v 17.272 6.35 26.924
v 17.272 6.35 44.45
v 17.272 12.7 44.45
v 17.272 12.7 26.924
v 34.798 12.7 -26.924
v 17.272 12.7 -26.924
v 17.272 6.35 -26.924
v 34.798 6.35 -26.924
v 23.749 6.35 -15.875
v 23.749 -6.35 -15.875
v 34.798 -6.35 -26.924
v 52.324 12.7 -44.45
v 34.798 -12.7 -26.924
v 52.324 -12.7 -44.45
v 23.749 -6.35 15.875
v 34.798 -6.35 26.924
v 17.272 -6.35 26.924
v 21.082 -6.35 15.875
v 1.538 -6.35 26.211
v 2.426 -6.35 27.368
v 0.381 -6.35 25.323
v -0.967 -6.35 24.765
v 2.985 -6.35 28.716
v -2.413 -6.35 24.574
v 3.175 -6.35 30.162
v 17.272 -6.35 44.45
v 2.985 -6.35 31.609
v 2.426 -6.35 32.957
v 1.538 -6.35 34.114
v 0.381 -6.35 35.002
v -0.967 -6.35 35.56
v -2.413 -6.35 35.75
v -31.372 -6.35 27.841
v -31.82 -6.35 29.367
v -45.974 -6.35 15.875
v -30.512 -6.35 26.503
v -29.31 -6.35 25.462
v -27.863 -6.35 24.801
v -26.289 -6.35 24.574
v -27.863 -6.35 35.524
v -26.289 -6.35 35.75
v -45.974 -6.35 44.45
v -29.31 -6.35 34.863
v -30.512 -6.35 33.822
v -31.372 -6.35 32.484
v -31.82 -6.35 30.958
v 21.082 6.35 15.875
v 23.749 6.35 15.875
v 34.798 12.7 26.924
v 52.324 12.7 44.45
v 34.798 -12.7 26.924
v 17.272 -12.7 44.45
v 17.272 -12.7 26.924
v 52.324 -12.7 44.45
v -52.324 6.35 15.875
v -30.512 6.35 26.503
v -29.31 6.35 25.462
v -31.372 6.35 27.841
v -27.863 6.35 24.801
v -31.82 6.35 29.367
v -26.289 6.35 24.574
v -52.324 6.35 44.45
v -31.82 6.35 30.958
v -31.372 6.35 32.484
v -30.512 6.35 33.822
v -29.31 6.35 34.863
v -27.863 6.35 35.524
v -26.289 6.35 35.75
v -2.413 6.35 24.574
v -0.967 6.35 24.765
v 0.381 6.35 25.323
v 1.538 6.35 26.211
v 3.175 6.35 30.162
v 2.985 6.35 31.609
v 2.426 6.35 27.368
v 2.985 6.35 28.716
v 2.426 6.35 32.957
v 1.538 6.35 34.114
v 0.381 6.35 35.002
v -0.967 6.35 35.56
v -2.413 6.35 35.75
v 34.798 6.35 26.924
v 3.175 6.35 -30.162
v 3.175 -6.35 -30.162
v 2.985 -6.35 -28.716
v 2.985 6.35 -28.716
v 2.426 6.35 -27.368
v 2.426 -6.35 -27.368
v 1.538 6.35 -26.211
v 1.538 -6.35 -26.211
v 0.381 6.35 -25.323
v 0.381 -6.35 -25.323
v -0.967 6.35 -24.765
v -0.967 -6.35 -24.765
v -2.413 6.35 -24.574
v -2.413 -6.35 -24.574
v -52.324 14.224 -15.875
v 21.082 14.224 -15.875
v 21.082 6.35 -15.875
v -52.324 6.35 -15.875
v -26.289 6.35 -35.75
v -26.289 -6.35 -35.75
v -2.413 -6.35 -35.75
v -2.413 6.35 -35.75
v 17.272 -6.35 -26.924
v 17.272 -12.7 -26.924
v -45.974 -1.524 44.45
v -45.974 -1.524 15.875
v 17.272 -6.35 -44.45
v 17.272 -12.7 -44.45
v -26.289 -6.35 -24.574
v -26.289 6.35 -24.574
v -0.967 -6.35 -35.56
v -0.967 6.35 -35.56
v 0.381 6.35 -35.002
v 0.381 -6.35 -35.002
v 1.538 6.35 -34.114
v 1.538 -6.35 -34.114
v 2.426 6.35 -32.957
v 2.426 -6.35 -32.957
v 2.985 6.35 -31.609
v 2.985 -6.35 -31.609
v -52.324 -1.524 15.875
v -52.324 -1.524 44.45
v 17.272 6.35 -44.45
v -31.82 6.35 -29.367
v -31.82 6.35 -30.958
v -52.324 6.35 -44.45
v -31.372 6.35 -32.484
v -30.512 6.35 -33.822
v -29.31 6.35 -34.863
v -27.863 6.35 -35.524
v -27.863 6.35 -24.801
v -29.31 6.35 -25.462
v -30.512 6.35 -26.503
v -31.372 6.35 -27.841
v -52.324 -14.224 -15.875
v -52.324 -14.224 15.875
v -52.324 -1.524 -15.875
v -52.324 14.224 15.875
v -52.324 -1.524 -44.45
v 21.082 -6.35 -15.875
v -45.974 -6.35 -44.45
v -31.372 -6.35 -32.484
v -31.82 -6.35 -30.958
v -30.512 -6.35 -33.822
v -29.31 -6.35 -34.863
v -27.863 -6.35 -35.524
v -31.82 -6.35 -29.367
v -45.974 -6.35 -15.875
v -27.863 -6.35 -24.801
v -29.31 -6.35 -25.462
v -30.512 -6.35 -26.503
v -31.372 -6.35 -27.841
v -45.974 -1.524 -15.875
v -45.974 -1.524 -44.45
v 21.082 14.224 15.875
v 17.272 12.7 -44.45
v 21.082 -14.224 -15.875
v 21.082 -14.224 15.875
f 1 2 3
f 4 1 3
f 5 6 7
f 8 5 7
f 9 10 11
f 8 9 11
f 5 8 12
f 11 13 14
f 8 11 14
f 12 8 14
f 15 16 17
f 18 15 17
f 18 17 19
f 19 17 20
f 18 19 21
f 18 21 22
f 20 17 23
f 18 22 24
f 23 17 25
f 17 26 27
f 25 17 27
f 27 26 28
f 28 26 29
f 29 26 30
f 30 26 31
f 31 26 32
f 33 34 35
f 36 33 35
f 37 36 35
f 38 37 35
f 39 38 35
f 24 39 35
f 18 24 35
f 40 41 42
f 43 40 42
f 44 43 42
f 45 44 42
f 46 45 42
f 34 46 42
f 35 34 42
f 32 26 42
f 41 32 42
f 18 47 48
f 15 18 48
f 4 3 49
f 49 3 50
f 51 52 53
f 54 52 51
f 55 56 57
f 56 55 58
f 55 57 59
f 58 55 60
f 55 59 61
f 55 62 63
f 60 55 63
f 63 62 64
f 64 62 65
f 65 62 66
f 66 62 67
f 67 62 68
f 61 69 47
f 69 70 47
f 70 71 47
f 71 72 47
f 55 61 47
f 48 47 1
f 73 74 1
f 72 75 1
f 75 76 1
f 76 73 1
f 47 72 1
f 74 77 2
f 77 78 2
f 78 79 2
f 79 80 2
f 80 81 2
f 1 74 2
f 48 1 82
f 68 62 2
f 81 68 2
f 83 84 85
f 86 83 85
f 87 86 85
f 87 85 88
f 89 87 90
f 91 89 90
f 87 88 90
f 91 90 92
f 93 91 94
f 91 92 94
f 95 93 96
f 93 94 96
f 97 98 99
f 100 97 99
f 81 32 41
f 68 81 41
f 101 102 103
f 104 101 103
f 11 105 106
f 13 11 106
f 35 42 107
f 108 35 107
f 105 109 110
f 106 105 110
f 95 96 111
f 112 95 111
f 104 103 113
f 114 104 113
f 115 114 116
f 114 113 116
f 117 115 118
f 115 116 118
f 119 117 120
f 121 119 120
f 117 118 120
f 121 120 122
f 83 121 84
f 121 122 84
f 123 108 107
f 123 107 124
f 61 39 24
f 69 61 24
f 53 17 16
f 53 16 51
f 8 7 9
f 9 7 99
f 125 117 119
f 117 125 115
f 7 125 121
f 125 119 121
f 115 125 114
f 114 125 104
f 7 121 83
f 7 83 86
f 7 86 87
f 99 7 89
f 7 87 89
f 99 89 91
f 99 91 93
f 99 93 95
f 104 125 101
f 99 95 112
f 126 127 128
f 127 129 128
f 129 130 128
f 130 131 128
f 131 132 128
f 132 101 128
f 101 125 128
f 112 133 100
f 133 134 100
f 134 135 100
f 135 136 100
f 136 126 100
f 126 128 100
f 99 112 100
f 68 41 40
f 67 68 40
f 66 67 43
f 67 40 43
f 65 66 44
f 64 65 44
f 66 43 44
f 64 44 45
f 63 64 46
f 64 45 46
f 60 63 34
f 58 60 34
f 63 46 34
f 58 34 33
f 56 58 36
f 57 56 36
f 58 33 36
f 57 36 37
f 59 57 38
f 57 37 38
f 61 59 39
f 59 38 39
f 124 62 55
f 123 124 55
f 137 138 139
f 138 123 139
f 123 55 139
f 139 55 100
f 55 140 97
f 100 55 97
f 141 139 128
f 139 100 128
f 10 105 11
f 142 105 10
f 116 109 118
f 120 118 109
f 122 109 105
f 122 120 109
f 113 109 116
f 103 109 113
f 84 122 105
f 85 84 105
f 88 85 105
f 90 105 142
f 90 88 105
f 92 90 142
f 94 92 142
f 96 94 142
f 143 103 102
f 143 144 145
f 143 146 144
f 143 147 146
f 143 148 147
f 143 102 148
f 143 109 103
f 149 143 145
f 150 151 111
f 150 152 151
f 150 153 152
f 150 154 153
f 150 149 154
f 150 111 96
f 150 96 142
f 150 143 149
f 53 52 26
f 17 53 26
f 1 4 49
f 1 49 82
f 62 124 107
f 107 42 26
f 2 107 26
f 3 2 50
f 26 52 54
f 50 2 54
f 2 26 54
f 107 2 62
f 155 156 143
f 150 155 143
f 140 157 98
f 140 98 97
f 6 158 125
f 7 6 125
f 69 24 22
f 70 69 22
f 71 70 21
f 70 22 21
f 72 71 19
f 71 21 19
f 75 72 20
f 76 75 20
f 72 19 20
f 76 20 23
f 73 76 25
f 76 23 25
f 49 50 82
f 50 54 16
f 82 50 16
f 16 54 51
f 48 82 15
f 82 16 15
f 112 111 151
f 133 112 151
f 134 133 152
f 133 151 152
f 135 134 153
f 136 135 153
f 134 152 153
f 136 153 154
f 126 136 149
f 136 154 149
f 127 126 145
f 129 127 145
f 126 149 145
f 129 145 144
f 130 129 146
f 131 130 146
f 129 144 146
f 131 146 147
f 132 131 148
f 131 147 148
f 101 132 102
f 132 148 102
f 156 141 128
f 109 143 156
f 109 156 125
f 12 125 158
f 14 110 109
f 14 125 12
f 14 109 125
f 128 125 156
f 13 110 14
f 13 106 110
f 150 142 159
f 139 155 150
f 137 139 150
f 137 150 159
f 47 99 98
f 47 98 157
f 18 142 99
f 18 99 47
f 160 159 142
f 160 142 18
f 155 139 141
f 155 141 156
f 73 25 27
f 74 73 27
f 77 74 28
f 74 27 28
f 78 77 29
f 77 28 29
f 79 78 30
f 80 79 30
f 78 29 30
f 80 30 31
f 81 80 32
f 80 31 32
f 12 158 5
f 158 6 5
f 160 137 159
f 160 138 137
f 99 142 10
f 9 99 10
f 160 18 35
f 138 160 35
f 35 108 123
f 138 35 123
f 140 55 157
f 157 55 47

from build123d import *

# Parameters (mm, degrees)
F0_W      = 104.648
F0_H      = 88.9
F1_DEPTH  = 12.7
F2_W      = 69.596
F2_H      = 6.35
F3_DEPTH  = 28.575
F4_W      = 69.596
F4_H      = 6.35
F5_DEPTH  = 28.575
F10_DEPTH = 1.524
F11_W     = 31.242
F11_H     = 31.75
F12_DEPTH = 28.449
F14_W     = 6.35
F14_H     = 11.049
F15_DEPTH = 35.053
F17_W     = 6.35
F17_H     = 11.049
F20_DEPTH = 35.053
F19_W     = 6.35
F19_H     = 11.049
F21_DEPTH = 35.053
F22_W     = 6.35
F22_H     = 11.049
F23_DEPTH = 35.053
F25_DEPTH = 26.925
F27_DEPTH = 20.575
F29_DEPTH = 20.575


with BuildPart() as f1:
    # F0 (on Front) → F1 (new body, symmetric)
    with BuildSketch(Plane.XZ):
        Rectangle(F0_W, F0_H)
    extrude(amount=F1_DEPTH, both=True)

    # F2 (on face) → F3 (cut)
    with BuildSketch(Plane.XY.offset(44.45)):
        with Locations((-17.526, 9.525)):
            Rectangle(F2_W, F2_H)
        Polygon((-45.974, -1.524), (-52.324, -1.524), (-52.324, -12.7), (17.272, -12.7), (17.272, -6.35), (-45.974, -6.35), align=None)
    extrude(amount=-F3_DEPTH, mode=Mode.SUBTRACT)

    # F4 (on face) → F5 (cut)
    with BuildSketch(Plane(origin=(0, 0, -44.45), x_dir=(1, 0, 0), z_dir=(0, 0, -1))):
        Polygon((-45.974, 6.35), (17.272, 6.35), (17.272, 12.7), (-52.324, 12.7), (-52.324, 1.524), (-45.974, 1.524), align=None)
        with Locations((-17.526, -9.525)):
            Rectangle(F4_W, F4_H)
    extrude(amount=-F5_DEPTH, mode=Mode.SUBTRACT)

    # F9 (on face) + F7 (on face) → F10 (join, symmetric)
    with BuildSketch(Plane(origin=(0, 12.7, 0), x_dir=(-1, 0, 0), z_dir=(0, 1, 0))):
        Polygon((52.324, 15.875), (-17.272, 15.875), (-52.324, 15.875), (-52.324, -15.875), (-17.272, -15.875), (52.324, -15.875), align=None)
    with BuildSketch(Plane.XZ.offset(12.7)):
        Polygon((52.324, -15.875), (52.324, 15.875), (17.272, 15.875), (-52.324, 15.875), (-52.324, -15.875), (17.272, -15.875), align=None)
    extrude(amount=F10_DEPTH, both=True, dir=(0, 1, 0))

    # F11 (on face) → F12 (cut, through all)
    with BuildSketch(Plane.XZ.offset(14.224)):
        with Locations((36.703, 0)):
            Rectangle(F11_W, F11_H)
    extrude(amount=-F12_DEPTH, mode=Mode.SUBTRACT)

    # F14 (on face) → F15 (cut, through all)
    with BuildSketch(Plane(origin=(17.272, 0, 0), x_dir=(0, -1, 0), z_dir=(-1, 0, 0))):
        with Locations((9.525, 21.3995)):
            Rectangle(F14_W, F14_H)
    extrude(amount=-F15_DEPTH, mode=Mode.SUBTRACT)

    # F17 (on face) → F20 (cut, through all)
    with BuildSketch(Plane(origin=(17.272, 0, 0), x_dir=(0, -1, 0), z_dir=(-1, 0, 0))):
        with Locations((-9.525, 21.3995)):
            Rectangle(F17_W, F17_H)
    extrude(amount=-F20_DEPTH, mode=Mode.SUBTRACT)

    # F19 (on face) → F21 (cut, through all)
    with BuildSketch(Plane(origin=(17.272, 0, 0), x_dir=(0, -1, 0), z_dir=(-1, 0, 0))):
        with Locations((-9.525, -21.3995)):
            Rectangle(F19_W, F19_H)
    extrude(amount=-F21_DEPTH, mode=Mode.SUBTRACT)

    # F22 (on face) → F23 (cut, through all)
    with BuildSketch(Plane(origin=(17.272, 0, 0), x_dir=(0, -1, 0), z_dir=(-1, 0, 0))):
        with Locations((9.525, -21.3995)):
            Rectangle(F22_W, F22_H)
    extrude(amount=-F23_DEPTH, mode=Mode.SUBTRACT)

    # F24 (on face) → F25 (cut, through all)
    with BuildSketch(Plane.XZ.offset(12.7)):
        Polygon((52.324, 26.924), (52.324, 44.45), (34.798, 26.924), align=None)
        Polygon((34.798, -26.924), (52.324, -44.45), (52.324, -26.924), align=None)
    extrude(amount=-F25_DEPTH, mode=Mode.SUBTRACT)

    # F26 (on face) → F27 (cut, through all)
    with BuildSketch(Plane.XZ.offset(6.35)):
        Polygon((23.749, -15.875), (34.798, -26.924), (52.324, -26.924), (52.324, -15.875), align=None)
        Polygon((52.324, 26.924), (34.798, 26.924), (23.749, 15.875), (52.324, 15.875), align=None)
    extrude(amount=-F27_DEPTH, mode=Mode.SUBTRACT)

    # F28 (on face) → F29 (cut, through all)
    with BuildSketch(Plane.XZ.offset(6.35)):
        with BuildLine():
            ThreePointArc((-26.289, -24.5745), (-22.3376873067, -26.2111873067), (-20.701, -30.1625))
            ThreePointArc((-20.701, -30.1625), (-22.3376873067, -34.1138126933), (-26.289, -35.7505))
            Line((-26.289, -35.7505), (-2.413, -35.7505))
            ThreePointArc((-2.413, -35.7505), (-8.001, -30.1625), (-2.413, -24.5745))
            Line((-2.413, -24.5745), (-26.289, -24.5745))
        make_face()
        with BuildLine():
            ThreePointArc((-26.289, -35.7505), (-22.3376873067, -34.1138126933), (-20.701, -30.1625))
            ThreePointArc((-20.701, -30.1625), (-22.3376873067, -26.2111873067), (-26.289, -24.5745))
            ThreePointArc((-26.289, -24.5745), (-31.877, -30.1625), (-26.289, -35.7505))
        make_face()
        with BuildLine():
            ThreePointArc((3.175, -30.1625), (1.5383126933, -26.2111873067), (-2.413, -24.5745))
            ThreePointArc((-2.413, -24.5745), (-8.001, -30.1625), (-2.413, -35.7505))
            ThreePointArc((-2.413, -35.7505), (1.5383126933, -34.1138126933), (3.175, -30.1625))
        make_face()
        with BuildLine():
            ThreePointArc((-26.289, 35.7505), (-22.3376873067, 34.1138126933), (-20.701, 30.1625))
            ThreePointArc((-20.701, 30.1625), (-22.3376873067, 26.2111873067), (-26.289, 24.5745))
            Line((-26.289, 24.5745), (-2.413, 24.5745))
            ThreePointArc((-2.413, 24.5745), (-8.001, 30.1625), (-2.413, 35.7505))
            Line((-2.413, 35.7505), (-26.289, 35.7505))
        make_face()
        with BuildLine():
            ThreePointArc((-26.289, 24.5745), (-22.3376873067, 26.2111873067), (-20.701, 30.1625))
            ThreePointArc((-20.701, 30.1625), (-22.3376873067, 34.1138126933), (-26.289, 35.7505))
            ThreePointArc((-26.289, 35.7505), (-31.877, 30.1625), (-26.289, 24.5745))
        make_face()
        with BuildLine():
            ThreePointArc((3.175, 30.1625), (1.5383126933, 34.1138126933), (-2.413, 35.7505))
            ThreePointArc((-2.413, 35.7505), (-8.001, 30.1625), (-2.413, 24.5745))
            ThreePointArc((-2.413, 24.5745), (1.5383126933, 26.2111873067), (3.175, 30.1625))
        make_face()
    extrude(amount=-F29_DEPTH, mode=Mode.SUBTRACT)


solid = f1.part
